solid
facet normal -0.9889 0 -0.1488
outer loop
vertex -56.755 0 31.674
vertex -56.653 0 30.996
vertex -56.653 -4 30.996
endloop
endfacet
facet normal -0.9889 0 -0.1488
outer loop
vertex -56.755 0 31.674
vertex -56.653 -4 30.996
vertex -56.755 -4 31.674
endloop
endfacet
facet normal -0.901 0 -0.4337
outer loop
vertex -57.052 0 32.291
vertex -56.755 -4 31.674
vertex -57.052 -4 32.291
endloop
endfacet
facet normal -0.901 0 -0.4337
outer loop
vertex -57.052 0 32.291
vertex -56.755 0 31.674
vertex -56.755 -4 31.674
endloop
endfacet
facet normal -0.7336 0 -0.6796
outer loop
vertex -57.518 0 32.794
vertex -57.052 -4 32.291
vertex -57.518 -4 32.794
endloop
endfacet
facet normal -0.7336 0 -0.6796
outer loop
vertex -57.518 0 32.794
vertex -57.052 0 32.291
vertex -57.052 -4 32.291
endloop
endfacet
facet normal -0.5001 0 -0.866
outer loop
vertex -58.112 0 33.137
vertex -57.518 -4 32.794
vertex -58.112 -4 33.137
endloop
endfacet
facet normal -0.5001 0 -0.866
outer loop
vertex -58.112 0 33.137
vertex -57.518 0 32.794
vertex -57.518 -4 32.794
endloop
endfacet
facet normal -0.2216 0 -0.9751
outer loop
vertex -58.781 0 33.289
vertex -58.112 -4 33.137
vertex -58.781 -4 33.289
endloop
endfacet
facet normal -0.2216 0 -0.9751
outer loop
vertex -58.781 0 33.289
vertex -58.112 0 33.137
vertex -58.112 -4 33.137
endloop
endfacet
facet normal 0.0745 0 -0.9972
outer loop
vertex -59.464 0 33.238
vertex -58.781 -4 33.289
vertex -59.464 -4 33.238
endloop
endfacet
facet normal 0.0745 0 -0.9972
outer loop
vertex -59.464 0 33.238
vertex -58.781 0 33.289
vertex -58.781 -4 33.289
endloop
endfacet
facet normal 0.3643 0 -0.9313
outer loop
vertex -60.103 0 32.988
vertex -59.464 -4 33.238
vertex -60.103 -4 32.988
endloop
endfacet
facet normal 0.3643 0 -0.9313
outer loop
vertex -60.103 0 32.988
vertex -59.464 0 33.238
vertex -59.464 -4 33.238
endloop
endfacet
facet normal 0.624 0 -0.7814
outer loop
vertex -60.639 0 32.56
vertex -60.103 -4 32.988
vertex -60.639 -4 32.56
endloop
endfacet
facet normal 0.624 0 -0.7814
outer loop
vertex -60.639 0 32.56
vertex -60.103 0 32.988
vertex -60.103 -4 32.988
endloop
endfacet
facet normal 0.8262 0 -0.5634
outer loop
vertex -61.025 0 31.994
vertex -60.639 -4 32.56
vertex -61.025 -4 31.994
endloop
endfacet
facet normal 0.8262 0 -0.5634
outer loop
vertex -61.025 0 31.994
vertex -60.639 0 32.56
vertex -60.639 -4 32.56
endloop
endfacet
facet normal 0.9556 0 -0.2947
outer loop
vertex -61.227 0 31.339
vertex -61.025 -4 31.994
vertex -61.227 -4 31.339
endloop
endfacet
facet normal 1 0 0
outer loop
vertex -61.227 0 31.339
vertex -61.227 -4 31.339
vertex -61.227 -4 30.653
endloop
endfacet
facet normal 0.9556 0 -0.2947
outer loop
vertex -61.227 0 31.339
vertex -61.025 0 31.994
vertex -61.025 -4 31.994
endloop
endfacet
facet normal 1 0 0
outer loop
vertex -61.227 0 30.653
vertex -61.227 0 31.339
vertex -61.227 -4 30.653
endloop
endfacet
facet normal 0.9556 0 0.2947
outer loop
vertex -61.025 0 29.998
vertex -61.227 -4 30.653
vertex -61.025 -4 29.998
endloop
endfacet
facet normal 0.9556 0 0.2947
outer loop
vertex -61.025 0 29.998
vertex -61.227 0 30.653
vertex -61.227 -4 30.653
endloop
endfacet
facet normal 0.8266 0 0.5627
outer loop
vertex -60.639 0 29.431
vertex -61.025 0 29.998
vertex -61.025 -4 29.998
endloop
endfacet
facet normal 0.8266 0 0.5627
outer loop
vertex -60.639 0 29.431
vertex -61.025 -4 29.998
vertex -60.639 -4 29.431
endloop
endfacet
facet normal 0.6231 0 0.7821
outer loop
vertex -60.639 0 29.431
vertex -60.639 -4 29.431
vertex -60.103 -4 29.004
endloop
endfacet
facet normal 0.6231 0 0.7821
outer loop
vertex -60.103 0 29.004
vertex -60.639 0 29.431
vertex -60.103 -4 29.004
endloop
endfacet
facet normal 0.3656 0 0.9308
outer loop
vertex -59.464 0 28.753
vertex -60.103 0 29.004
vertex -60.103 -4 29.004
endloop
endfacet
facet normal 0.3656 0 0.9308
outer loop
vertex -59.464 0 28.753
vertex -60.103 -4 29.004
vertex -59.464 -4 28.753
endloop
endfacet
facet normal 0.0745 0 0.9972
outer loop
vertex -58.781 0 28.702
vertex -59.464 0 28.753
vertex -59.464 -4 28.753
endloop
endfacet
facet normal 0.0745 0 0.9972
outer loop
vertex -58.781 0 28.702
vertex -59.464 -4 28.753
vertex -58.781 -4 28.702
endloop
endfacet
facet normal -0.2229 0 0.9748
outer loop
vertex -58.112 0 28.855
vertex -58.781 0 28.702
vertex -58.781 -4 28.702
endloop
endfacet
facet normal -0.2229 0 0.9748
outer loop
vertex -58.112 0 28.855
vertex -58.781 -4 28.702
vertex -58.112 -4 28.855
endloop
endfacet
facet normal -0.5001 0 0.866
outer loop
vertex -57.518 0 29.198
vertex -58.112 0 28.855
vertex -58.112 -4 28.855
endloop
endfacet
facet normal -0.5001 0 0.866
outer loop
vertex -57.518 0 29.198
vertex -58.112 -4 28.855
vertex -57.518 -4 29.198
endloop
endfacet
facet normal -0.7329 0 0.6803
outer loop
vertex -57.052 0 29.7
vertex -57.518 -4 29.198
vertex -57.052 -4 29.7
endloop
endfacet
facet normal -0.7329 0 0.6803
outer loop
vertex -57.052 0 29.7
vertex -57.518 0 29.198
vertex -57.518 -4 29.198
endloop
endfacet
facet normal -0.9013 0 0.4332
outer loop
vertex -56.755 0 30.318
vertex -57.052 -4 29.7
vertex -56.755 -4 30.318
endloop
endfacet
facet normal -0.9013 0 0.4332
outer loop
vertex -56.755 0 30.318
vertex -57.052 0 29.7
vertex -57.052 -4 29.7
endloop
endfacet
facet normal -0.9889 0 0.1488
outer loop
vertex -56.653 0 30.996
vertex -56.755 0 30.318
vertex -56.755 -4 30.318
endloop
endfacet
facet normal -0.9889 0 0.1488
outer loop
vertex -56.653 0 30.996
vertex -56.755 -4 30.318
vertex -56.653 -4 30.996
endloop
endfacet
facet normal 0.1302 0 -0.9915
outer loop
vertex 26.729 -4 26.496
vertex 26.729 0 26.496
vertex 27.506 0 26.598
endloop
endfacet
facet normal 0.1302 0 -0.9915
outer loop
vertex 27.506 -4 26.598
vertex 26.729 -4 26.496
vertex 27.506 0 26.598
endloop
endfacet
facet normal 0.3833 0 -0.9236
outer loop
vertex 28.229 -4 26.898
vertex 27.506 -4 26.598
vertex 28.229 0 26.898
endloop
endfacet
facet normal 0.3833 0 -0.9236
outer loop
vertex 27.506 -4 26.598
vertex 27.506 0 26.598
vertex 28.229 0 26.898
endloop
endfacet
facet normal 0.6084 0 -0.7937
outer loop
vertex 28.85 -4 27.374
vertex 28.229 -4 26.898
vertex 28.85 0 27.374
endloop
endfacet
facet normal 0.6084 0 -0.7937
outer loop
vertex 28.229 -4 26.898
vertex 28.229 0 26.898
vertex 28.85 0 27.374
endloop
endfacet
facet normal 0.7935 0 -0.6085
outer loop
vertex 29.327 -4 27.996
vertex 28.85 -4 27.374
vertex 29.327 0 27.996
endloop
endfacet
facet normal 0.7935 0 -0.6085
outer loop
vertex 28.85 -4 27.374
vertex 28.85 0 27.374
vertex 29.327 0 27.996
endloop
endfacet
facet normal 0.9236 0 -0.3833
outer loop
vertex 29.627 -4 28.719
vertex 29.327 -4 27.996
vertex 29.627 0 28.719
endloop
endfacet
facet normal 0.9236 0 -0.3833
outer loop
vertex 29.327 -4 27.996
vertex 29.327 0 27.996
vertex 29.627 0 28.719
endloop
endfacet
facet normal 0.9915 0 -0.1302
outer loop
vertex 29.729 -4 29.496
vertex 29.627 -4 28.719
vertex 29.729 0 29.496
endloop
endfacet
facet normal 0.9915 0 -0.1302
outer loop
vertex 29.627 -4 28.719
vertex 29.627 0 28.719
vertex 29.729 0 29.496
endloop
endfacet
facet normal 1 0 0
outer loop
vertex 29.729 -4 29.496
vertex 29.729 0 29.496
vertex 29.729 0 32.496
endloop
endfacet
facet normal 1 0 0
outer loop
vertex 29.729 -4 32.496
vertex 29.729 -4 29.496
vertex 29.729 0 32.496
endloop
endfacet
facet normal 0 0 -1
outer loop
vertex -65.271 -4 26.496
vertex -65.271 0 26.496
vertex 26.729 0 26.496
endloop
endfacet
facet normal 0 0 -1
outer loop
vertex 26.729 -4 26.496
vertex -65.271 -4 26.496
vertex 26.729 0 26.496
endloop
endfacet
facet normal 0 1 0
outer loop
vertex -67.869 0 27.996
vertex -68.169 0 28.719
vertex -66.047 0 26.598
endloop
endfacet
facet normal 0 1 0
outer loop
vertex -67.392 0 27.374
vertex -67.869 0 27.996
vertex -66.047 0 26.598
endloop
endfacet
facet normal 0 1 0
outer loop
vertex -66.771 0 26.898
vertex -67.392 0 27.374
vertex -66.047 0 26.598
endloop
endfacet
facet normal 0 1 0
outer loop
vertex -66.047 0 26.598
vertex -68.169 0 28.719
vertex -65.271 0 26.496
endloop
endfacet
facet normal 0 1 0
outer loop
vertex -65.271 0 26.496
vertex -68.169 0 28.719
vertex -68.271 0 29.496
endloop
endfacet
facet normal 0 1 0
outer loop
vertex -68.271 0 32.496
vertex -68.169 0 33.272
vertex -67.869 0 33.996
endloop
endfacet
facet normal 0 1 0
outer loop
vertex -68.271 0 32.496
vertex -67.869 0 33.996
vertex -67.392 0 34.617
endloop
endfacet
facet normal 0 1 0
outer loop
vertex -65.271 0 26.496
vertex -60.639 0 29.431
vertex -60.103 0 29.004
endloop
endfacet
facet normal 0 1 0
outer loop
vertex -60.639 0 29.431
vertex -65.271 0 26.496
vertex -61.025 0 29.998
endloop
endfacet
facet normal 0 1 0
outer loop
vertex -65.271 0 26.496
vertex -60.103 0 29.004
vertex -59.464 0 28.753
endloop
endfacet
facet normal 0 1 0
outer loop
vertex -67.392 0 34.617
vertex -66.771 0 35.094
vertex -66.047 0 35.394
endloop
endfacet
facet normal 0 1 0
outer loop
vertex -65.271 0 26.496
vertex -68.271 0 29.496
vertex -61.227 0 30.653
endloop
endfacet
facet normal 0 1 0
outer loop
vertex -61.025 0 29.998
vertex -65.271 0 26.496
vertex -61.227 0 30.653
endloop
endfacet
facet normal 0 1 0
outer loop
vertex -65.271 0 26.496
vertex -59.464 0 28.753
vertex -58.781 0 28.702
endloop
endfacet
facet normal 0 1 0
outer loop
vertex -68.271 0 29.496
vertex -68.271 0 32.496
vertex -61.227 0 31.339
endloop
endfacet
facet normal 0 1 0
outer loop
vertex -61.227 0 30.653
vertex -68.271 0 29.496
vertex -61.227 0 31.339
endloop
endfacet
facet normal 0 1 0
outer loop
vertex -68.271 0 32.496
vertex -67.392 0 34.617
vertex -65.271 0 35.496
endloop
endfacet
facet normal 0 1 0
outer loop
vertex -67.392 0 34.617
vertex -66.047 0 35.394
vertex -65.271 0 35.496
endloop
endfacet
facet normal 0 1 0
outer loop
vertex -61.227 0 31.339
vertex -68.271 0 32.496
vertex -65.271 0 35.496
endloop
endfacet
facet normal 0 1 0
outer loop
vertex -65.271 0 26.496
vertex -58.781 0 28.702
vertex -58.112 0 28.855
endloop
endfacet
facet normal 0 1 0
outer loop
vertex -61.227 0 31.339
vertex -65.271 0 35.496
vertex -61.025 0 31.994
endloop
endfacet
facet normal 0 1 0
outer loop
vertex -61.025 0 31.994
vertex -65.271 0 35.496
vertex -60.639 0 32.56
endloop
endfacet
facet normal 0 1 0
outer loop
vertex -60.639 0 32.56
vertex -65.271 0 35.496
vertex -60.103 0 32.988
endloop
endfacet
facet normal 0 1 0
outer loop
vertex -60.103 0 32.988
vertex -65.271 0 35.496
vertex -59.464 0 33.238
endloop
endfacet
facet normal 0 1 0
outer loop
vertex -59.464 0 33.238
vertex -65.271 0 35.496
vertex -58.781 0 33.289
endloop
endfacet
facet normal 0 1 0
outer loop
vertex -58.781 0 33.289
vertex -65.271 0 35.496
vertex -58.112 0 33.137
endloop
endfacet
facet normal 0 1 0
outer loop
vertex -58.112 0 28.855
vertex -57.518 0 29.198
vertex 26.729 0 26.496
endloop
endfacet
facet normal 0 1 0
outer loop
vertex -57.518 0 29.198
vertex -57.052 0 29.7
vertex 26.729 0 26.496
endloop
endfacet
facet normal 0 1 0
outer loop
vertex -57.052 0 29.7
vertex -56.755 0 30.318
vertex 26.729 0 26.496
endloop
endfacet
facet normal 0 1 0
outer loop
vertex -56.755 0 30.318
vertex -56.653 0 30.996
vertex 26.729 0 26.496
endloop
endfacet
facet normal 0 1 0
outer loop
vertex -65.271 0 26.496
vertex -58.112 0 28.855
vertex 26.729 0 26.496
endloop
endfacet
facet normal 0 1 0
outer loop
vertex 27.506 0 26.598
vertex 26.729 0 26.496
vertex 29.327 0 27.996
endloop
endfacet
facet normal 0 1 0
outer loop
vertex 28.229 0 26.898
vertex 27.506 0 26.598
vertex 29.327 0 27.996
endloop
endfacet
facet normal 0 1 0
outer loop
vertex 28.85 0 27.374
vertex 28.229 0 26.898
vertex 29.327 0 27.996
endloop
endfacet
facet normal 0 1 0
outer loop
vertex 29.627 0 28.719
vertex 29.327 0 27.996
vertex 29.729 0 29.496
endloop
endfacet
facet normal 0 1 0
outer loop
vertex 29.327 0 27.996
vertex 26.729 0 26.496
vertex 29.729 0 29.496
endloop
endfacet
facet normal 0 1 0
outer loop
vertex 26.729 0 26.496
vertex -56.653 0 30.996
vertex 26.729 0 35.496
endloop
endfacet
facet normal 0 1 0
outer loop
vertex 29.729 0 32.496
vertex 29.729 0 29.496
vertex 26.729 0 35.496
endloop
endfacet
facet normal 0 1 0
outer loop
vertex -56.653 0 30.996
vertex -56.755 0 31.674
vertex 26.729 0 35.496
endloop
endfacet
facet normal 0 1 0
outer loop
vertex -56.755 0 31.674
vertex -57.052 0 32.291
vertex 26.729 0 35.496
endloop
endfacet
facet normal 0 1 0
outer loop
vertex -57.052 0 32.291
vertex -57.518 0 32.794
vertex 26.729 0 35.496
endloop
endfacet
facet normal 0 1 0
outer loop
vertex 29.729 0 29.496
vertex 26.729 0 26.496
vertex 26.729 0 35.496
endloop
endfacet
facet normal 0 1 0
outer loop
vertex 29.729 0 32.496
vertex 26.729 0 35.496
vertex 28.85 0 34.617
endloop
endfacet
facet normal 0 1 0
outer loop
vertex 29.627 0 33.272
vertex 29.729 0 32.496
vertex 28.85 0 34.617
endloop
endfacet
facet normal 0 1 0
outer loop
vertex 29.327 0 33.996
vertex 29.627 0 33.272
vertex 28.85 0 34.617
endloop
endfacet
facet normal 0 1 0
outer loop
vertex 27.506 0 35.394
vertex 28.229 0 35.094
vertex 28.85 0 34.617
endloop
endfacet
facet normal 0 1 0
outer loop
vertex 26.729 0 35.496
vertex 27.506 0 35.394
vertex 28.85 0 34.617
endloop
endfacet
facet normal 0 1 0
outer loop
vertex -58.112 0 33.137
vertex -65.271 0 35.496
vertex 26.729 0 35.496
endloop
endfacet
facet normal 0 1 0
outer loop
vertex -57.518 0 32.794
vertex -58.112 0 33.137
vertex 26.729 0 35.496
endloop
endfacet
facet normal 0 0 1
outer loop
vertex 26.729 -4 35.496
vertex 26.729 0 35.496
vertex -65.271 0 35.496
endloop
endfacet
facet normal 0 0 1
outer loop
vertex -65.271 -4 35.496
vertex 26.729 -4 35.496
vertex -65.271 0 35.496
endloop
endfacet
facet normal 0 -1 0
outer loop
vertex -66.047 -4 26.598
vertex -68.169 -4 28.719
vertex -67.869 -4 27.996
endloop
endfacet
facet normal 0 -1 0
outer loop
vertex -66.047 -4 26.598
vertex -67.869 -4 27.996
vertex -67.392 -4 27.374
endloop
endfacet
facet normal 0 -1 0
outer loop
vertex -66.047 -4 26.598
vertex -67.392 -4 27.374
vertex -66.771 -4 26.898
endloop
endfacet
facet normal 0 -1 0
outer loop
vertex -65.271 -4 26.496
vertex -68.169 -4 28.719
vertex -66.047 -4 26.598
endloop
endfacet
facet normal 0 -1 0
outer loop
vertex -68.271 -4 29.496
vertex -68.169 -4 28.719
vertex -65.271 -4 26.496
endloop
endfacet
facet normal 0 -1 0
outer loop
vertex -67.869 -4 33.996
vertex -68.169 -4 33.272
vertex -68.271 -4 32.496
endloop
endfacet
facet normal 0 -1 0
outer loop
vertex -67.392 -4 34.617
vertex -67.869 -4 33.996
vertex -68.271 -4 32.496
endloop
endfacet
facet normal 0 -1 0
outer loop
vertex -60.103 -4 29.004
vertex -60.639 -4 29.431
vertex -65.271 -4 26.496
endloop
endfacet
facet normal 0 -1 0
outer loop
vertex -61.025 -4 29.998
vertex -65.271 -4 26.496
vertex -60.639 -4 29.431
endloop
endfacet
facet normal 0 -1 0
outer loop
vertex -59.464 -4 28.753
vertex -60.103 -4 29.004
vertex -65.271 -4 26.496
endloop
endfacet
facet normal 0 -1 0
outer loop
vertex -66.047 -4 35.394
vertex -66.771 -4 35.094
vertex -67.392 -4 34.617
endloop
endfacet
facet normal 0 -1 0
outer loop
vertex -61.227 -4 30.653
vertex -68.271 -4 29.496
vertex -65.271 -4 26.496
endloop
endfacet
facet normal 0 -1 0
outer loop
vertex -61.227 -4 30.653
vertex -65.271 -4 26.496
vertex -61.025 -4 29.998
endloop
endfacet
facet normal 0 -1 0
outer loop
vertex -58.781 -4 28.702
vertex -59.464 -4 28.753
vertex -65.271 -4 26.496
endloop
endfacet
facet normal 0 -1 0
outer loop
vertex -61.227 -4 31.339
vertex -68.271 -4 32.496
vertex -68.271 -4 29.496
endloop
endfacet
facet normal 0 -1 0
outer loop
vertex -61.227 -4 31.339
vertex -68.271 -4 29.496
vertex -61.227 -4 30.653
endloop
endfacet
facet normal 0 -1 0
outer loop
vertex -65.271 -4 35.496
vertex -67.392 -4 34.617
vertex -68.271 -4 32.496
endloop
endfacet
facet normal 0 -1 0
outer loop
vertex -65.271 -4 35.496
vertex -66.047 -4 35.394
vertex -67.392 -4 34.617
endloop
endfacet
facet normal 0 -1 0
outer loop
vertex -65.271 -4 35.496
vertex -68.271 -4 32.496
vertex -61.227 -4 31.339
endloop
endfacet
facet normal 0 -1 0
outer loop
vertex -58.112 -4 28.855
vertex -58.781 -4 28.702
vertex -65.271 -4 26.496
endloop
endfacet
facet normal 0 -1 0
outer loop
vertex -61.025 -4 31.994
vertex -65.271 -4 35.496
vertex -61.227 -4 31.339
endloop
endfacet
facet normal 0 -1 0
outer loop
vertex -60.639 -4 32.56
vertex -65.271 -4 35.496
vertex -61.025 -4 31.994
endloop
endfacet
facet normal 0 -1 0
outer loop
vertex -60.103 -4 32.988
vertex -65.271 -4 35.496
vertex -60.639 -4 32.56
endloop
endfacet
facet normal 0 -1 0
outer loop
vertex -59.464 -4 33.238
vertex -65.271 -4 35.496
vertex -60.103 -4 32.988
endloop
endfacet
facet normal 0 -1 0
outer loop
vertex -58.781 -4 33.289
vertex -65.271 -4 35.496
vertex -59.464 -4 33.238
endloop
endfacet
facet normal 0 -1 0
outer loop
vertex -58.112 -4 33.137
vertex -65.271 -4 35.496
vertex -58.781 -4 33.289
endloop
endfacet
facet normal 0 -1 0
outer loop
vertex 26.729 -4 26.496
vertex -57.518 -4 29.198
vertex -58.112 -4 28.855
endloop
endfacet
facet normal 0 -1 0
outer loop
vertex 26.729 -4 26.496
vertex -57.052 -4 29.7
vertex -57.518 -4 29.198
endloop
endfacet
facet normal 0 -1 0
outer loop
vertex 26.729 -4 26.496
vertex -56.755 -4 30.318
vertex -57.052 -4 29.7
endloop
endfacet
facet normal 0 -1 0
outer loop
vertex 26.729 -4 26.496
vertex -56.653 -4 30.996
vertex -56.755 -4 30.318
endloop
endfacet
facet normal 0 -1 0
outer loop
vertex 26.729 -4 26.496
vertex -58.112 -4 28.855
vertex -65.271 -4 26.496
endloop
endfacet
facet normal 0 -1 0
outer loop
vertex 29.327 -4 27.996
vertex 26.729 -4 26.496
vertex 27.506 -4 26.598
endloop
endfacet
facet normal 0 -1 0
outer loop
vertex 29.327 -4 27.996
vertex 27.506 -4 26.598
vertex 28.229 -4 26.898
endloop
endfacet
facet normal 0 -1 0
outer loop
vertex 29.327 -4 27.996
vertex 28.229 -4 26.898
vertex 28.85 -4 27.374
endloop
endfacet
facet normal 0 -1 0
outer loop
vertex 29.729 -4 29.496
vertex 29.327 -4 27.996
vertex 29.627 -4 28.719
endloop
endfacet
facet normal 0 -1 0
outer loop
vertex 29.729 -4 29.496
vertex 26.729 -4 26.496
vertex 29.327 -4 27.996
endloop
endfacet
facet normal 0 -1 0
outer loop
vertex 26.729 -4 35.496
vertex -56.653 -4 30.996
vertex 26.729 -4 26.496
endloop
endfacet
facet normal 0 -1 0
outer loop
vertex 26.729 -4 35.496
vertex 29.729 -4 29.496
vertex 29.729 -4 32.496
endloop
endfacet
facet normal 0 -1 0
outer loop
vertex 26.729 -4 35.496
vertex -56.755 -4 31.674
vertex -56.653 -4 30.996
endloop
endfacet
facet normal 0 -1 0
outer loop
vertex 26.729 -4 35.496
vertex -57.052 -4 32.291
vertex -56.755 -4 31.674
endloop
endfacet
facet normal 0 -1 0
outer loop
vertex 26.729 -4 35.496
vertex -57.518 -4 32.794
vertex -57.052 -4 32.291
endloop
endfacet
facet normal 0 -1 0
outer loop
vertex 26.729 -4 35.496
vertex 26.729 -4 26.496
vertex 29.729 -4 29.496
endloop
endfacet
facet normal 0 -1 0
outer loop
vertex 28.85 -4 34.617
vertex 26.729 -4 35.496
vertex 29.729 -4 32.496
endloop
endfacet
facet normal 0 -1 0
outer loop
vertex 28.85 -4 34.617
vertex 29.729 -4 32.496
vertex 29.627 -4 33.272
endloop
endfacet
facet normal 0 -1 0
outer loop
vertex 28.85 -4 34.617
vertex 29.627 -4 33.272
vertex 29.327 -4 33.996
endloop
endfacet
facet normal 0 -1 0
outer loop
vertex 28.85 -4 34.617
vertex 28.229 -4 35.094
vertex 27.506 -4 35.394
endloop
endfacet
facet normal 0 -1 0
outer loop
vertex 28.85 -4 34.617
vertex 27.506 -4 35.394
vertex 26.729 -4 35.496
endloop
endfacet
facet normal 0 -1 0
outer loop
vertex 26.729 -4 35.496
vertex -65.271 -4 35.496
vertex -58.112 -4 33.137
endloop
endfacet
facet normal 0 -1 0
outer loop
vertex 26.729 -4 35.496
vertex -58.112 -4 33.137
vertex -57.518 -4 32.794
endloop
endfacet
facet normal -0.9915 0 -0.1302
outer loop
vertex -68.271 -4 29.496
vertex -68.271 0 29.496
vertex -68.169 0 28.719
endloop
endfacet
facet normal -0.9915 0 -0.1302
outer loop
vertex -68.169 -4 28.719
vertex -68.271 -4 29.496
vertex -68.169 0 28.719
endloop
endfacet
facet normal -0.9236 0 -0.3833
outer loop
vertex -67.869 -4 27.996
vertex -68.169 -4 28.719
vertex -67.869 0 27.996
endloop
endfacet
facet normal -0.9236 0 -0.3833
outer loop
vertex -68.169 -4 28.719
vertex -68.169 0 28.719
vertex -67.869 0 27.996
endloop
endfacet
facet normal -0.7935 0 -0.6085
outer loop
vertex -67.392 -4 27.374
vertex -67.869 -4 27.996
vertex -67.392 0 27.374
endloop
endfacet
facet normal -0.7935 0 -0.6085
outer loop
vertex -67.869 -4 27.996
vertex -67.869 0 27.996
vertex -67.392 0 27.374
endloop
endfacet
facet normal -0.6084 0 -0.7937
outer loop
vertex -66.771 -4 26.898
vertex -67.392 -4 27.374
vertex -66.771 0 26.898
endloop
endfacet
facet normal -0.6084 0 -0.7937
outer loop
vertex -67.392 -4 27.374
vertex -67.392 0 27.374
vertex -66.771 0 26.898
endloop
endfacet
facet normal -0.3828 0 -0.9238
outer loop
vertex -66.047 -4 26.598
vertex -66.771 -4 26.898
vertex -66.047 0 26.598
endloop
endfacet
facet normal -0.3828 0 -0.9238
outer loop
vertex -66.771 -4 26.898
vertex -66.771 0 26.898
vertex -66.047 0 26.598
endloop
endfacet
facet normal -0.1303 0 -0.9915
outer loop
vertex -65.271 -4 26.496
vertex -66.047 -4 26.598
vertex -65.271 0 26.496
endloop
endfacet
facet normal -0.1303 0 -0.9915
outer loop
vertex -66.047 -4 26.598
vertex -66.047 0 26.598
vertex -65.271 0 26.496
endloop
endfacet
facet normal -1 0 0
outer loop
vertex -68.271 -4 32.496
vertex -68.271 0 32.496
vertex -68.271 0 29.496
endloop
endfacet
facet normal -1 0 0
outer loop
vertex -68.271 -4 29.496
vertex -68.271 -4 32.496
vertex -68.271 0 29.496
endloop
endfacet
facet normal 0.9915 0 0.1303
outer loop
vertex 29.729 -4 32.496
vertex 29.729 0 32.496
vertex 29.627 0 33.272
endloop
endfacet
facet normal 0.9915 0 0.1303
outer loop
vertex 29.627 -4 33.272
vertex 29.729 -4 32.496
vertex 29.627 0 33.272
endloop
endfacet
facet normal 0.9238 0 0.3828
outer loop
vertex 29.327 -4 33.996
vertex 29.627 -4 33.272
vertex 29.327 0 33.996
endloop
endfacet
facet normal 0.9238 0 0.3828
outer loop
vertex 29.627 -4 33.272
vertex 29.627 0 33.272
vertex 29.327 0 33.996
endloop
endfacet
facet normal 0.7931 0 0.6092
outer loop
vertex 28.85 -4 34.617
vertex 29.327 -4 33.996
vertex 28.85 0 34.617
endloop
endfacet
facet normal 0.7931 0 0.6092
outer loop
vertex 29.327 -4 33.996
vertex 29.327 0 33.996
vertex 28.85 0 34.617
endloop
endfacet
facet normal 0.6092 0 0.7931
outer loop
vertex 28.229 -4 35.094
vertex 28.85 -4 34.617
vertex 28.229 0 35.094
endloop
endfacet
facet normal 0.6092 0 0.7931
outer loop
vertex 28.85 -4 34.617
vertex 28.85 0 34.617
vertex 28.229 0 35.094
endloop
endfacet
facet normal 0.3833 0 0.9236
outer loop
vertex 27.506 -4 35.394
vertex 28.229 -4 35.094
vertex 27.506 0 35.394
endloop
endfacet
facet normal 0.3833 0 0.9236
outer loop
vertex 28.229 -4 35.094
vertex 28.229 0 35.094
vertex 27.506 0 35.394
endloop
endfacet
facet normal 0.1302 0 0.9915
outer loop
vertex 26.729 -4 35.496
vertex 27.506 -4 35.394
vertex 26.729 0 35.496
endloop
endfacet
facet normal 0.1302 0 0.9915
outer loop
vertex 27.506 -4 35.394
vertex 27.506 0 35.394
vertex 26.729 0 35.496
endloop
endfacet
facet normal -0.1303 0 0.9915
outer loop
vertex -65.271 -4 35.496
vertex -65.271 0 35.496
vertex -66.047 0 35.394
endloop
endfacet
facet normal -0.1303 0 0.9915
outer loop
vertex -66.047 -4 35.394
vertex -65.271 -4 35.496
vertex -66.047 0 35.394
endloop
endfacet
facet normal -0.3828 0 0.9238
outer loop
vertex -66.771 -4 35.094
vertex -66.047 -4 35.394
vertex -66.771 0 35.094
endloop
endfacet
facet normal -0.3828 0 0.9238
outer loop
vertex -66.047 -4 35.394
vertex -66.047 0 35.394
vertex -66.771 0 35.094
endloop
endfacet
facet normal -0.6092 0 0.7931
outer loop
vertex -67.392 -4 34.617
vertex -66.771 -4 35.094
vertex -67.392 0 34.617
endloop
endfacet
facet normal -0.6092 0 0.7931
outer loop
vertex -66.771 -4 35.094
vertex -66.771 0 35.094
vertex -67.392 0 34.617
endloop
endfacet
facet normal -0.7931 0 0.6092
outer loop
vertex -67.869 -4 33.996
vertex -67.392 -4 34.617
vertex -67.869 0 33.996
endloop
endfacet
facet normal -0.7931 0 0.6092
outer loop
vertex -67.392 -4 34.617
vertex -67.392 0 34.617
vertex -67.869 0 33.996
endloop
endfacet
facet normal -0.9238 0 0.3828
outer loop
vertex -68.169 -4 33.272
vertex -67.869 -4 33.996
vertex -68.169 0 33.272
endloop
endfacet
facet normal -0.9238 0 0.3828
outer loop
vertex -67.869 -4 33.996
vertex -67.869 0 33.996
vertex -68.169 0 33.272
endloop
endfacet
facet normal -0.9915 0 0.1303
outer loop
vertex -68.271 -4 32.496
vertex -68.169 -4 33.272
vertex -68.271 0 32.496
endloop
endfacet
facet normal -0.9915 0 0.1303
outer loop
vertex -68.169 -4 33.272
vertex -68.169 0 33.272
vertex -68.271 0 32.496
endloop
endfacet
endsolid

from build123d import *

# Parameters (mm, degrees)
F0_R     = 2.3
F1_DEPTH = 4


with BuildPart() as f1:
    # F0 (on Front) → F1 (new body)
    with BuildSketch(Plane.XZ):
        with BuildLine():
            Line((26.729051, 35.495812), (-65.270949, 35.495812))
            ThreePointArc((-65.270949, 35.495812), (-67.39227, 34.617132), (-68.270949, 32.495812))
            Line((-68.270949, 32.495812), (-68.270949, 29.495812))
            ThreePointArc((-68.270949, 29.495812), (-67.39227, 27.374491), (-65.270949, 26.495812))
            Line((-65.270949, 26.495812), (26.729051, 26.495812))
            ThreePointArc((26.729051, 26.495812), (28.850371, 27.374491), (29.729051, 29.495812))
            Line((29.729051, 29.495812), (29.729051, 32.495812))
            ThreePointArc((29.729051, 32.495812), (28.850371, 34.617132), (26.729051, 35.495812))
        make_face()
        with Locations((-58.952514, 30.995812)):
            Circle(F0_R, mode=Mode.SUBTRACT)
    extrude(amount=F1_DEPTH)


solid = f1.part
